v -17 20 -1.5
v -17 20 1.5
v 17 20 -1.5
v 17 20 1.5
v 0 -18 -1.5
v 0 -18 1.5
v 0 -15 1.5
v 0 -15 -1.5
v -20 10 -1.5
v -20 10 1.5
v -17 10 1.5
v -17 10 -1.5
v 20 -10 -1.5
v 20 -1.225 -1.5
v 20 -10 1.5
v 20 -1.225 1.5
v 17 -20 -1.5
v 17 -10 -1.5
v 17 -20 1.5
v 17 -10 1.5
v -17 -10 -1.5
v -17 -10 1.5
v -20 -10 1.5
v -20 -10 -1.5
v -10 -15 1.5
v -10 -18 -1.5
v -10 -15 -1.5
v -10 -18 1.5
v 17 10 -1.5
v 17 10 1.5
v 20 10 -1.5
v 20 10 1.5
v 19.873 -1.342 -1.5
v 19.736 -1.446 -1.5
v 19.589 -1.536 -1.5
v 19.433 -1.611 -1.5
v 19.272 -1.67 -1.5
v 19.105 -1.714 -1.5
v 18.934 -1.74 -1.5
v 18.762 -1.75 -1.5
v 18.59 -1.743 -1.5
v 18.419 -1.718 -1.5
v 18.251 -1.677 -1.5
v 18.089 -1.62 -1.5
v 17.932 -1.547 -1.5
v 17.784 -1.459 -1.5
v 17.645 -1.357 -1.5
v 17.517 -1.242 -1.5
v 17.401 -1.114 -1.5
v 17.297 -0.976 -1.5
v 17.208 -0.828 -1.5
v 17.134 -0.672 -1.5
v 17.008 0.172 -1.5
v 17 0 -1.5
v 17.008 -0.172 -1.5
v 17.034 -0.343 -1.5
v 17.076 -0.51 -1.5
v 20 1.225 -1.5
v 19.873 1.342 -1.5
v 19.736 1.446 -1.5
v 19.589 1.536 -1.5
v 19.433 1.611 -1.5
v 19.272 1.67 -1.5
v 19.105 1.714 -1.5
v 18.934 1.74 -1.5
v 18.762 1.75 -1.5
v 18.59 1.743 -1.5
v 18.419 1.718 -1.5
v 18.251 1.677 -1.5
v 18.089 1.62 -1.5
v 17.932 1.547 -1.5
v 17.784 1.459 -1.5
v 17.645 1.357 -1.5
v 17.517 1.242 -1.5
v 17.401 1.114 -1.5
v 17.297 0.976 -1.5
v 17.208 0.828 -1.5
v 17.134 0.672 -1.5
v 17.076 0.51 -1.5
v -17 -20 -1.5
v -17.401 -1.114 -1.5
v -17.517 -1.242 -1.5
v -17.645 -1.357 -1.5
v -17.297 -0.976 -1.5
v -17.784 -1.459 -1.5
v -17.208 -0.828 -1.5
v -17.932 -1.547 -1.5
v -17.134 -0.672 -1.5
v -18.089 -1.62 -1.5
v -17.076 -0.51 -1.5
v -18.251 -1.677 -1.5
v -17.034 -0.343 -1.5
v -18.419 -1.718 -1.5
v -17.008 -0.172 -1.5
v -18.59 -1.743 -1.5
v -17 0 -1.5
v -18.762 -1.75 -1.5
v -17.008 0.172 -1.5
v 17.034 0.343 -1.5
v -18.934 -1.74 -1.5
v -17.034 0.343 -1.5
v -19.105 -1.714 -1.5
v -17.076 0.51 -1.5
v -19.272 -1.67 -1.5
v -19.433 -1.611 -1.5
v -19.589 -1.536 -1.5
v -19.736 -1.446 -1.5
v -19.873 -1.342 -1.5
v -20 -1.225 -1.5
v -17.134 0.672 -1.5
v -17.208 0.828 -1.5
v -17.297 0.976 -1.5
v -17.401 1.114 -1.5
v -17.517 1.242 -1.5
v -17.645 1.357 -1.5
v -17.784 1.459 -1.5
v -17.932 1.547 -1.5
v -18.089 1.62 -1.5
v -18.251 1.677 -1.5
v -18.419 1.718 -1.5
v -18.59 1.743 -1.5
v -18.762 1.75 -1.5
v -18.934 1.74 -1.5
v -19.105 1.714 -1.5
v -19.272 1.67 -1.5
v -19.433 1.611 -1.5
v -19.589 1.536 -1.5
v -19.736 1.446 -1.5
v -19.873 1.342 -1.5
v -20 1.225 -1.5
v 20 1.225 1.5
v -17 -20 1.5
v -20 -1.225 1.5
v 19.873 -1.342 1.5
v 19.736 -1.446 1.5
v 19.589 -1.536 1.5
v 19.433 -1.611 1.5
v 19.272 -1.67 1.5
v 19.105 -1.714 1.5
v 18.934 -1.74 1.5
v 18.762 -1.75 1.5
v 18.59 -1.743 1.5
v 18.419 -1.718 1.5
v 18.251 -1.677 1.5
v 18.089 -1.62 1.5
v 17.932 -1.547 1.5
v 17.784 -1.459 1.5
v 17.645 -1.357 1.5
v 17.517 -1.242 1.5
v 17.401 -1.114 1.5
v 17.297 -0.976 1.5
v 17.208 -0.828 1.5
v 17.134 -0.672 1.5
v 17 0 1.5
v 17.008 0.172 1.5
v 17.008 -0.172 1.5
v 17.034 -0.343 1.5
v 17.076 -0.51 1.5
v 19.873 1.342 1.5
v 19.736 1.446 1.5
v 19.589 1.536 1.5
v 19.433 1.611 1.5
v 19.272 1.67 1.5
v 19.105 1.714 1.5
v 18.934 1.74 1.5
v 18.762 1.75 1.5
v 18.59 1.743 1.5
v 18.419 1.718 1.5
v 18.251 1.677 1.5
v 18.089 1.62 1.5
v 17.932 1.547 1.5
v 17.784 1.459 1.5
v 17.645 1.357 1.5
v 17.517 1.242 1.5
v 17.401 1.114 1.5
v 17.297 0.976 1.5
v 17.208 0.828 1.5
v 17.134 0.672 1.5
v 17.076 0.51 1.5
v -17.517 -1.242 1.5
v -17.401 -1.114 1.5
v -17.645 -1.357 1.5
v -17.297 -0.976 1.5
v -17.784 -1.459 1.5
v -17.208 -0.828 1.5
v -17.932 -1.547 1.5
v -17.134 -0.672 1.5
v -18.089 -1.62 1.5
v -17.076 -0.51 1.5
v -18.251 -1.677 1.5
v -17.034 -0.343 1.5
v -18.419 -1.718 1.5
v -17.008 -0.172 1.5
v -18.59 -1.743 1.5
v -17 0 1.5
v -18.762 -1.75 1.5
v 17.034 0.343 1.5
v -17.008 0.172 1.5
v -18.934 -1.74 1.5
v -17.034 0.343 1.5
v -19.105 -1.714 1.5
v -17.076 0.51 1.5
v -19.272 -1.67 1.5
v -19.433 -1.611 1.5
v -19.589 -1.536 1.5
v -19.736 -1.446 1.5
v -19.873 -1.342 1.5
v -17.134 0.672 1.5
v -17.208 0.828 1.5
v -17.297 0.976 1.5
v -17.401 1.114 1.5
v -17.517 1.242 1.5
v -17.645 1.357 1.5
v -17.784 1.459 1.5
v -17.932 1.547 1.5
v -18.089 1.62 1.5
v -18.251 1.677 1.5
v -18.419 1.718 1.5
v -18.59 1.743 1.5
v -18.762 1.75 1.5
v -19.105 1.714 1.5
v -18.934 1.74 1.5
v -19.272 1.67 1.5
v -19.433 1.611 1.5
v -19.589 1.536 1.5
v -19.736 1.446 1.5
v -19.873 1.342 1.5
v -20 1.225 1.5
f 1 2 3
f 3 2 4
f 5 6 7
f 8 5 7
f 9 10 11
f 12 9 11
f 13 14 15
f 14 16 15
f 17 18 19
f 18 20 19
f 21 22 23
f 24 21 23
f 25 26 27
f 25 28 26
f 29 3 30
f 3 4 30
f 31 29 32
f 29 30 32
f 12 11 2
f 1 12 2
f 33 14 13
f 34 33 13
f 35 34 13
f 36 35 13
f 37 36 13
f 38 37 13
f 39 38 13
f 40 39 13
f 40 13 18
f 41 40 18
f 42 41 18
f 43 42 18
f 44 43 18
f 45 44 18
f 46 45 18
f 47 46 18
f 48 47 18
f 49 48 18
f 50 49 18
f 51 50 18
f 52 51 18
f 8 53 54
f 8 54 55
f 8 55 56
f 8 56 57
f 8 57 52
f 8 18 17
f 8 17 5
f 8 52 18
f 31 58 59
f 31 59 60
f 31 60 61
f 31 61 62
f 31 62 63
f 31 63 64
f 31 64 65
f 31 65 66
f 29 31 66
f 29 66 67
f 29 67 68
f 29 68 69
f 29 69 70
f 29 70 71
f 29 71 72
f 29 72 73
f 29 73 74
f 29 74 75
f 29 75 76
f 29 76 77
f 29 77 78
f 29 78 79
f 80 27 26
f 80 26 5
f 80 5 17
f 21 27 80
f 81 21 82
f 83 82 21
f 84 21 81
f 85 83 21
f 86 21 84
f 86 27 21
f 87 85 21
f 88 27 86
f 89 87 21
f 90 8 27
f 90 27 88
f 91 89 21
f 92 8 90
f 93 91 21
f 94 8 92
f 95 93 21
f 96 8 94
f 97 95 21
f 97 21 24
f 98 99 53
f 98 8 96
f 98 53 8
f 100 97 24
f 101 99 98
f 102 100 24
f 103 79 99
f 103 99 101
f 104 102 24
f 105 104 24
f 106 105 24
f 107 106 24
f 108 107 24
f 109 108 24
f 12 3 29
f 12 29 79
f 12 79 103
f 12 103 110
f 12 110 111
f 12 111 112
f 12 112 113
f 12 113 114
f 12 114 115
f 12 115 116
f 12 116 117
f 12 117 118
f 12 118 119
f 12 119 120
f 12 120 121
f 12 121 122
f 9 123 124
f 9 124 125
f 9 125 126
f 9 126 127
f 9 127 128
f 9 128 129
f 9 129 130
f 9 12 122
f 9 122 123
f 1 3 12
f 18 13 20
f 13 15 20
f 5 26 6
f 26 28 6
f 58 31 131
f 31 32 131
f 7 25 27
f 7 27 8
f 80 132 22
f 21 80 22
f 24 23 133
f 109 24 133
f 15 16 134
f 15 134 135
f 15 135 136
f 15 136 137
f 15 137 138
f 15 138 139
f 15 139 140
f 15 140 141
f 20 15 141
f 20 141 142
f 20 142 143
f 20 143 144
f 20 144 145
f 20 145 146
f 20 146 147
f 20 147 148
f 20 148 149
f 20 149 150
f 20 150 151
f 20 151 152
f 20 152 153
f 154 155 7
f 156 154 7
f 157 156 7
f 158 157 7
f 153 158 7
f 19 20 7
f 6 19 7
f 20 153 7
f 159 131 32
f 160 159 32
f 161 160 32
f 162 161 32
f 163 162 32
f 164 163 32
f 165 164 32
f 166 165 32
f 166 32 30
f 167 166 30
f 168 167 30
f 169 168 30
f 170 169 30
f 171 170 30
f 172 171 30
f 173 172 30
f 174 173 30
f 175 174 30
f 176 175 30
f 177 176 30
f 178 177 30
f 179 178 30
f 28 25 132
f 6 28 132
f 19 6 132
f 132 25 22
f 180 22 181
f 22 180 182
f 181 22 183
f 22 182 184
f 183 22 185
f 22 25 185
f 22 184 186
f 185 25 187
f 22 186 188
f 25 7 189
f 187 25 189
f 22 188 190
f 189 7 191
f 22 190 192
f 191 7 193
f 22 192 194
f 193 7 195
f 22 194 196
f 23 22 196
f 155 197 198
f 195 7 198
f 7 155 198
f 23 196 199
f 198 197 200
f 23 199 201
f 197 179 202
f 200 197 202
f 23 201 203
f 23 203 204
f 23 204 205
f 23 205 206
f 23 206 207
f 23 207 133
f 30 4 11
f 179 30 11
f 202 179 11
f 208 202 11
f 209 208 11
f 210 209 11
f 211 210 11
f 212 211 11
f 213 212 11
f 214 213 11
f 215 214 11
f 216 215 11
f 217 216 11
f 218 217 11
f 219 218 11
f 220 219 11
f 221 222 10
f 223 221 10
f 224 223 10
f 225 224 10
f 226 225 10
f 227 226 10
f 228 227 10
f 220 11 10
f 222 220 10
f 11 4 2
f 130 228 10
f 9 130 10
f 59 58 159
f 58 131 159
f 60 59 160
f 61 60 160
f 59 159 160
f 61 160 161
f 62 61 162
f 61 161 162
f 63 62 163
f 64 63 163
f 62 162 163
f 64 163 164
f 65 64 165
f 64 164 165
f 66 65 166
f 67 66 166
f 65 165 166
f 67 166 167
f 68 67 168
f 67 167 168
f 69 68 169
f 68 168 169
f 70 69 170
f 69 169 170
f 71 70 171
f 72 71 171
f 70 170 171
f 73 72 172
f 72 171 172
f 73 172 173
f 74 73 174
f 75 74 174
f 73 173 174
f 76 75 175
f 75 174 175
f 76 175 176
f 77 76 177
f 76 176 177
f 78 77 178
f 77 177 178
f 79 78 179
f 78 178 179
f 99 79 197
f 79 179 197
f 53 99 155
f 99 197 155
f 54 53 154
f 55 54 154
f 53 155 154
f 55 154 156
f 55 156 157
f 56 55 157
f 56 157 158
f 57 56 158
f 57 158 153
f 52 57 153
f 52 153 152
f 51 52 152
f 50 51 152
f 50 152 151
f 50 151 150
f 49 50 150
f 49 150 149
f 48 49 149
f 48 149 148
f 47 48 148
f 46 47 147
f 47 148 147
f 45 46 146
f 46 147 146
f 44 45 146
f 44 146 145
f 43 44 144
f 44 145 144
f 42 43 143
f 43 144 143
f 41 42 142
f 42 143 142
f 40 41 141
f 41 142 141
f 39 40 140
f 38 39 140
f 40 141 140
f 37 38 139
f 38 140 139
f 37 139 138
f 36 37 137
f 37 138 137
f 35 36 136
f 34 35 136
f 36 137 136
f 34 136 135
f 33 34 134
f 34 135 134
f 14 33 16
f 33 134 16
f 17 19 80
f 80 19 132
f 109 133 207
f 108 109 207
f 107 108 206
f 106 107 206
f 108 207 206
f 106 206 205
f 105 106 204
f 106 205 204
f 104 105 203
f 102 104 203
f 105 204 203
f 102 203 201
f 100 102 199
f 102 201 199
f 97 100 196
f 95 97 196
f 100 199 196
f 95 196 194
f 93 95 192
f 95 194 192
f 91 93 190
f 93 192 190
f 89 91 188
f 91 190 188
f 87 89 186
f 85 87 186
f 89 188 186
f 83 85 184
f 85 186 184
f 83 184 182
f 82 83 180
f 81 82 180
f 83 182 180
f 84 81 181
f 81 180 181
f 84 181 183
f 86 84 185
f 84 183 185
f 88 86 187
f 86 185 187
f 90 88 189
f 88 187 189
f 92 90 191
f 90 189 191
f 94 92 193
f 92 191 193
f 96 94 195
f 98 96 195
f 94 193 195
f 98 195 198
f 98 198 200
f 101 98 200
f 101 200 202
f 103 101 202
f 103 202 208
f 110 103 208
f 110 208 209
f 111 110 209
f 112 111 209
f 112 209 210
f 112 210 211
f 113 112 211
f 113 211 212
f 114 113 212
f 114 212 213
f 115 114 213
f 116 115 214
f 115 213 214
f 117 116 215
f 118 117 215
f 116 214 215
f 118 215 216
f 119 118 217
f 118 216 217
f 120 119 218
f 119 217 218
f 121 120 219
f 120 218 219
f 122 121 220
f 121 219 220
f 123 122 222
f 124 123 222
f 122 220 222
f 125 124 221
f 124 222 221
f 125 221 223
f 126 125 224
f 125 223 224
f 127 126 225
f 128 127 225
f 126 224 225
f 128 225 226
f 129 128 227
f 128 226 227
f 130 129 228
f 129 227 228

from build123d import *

# Parameters (mm, degrees)
SKETCH_1_W      = 10
SKETCH_1_H      = 3
EXTRUDE_1_DEPTH = 1.5


with BuildPart() as part:
    # 草图1 → 凸台-拉伸1 (new body, symmetric)
    with BuildSketch(Plane.XY):
        with BuildLine():
            Line((-17, 20), (17, 20))
            Line((17, 20), (17, 10))
            Line((17, 10), (20, 10))
            Line((20, 10), (20, 1.224744871))
            ThreePointArc((20, 1.224744871), (17, 0), (20, -1.224744871))
            Line((20, -1.224744871), (20, -10))
            Line((20, -10), (17, -10))
            Line((17, -10), (17, -20))
            Line((17, -20), (-17, -20))
            Line((-17, -20), (-17, -10))
            Line((-17, -10), (-20, -10))
            Line((-20, -10), (-20, -1.224744871))
            ThreePointArc((-20, -1.224744871), (-17, 0), (-20, 1.224744871))
            Line((-20, 1.224744871), (-20, 10))
            Line((-20, 10), (-17, 10))
            Line((-17, 10), (-17, 20))
        make_face()
        with Locations((-5, -16.5)):
            Rectangle(SKETCH_1_W, SKETCH_1_H, mode=Mode.SUBTRACT)
    extrude(amount=EXTRUDE_1_DEPTH, both=True)


solid = part.part
